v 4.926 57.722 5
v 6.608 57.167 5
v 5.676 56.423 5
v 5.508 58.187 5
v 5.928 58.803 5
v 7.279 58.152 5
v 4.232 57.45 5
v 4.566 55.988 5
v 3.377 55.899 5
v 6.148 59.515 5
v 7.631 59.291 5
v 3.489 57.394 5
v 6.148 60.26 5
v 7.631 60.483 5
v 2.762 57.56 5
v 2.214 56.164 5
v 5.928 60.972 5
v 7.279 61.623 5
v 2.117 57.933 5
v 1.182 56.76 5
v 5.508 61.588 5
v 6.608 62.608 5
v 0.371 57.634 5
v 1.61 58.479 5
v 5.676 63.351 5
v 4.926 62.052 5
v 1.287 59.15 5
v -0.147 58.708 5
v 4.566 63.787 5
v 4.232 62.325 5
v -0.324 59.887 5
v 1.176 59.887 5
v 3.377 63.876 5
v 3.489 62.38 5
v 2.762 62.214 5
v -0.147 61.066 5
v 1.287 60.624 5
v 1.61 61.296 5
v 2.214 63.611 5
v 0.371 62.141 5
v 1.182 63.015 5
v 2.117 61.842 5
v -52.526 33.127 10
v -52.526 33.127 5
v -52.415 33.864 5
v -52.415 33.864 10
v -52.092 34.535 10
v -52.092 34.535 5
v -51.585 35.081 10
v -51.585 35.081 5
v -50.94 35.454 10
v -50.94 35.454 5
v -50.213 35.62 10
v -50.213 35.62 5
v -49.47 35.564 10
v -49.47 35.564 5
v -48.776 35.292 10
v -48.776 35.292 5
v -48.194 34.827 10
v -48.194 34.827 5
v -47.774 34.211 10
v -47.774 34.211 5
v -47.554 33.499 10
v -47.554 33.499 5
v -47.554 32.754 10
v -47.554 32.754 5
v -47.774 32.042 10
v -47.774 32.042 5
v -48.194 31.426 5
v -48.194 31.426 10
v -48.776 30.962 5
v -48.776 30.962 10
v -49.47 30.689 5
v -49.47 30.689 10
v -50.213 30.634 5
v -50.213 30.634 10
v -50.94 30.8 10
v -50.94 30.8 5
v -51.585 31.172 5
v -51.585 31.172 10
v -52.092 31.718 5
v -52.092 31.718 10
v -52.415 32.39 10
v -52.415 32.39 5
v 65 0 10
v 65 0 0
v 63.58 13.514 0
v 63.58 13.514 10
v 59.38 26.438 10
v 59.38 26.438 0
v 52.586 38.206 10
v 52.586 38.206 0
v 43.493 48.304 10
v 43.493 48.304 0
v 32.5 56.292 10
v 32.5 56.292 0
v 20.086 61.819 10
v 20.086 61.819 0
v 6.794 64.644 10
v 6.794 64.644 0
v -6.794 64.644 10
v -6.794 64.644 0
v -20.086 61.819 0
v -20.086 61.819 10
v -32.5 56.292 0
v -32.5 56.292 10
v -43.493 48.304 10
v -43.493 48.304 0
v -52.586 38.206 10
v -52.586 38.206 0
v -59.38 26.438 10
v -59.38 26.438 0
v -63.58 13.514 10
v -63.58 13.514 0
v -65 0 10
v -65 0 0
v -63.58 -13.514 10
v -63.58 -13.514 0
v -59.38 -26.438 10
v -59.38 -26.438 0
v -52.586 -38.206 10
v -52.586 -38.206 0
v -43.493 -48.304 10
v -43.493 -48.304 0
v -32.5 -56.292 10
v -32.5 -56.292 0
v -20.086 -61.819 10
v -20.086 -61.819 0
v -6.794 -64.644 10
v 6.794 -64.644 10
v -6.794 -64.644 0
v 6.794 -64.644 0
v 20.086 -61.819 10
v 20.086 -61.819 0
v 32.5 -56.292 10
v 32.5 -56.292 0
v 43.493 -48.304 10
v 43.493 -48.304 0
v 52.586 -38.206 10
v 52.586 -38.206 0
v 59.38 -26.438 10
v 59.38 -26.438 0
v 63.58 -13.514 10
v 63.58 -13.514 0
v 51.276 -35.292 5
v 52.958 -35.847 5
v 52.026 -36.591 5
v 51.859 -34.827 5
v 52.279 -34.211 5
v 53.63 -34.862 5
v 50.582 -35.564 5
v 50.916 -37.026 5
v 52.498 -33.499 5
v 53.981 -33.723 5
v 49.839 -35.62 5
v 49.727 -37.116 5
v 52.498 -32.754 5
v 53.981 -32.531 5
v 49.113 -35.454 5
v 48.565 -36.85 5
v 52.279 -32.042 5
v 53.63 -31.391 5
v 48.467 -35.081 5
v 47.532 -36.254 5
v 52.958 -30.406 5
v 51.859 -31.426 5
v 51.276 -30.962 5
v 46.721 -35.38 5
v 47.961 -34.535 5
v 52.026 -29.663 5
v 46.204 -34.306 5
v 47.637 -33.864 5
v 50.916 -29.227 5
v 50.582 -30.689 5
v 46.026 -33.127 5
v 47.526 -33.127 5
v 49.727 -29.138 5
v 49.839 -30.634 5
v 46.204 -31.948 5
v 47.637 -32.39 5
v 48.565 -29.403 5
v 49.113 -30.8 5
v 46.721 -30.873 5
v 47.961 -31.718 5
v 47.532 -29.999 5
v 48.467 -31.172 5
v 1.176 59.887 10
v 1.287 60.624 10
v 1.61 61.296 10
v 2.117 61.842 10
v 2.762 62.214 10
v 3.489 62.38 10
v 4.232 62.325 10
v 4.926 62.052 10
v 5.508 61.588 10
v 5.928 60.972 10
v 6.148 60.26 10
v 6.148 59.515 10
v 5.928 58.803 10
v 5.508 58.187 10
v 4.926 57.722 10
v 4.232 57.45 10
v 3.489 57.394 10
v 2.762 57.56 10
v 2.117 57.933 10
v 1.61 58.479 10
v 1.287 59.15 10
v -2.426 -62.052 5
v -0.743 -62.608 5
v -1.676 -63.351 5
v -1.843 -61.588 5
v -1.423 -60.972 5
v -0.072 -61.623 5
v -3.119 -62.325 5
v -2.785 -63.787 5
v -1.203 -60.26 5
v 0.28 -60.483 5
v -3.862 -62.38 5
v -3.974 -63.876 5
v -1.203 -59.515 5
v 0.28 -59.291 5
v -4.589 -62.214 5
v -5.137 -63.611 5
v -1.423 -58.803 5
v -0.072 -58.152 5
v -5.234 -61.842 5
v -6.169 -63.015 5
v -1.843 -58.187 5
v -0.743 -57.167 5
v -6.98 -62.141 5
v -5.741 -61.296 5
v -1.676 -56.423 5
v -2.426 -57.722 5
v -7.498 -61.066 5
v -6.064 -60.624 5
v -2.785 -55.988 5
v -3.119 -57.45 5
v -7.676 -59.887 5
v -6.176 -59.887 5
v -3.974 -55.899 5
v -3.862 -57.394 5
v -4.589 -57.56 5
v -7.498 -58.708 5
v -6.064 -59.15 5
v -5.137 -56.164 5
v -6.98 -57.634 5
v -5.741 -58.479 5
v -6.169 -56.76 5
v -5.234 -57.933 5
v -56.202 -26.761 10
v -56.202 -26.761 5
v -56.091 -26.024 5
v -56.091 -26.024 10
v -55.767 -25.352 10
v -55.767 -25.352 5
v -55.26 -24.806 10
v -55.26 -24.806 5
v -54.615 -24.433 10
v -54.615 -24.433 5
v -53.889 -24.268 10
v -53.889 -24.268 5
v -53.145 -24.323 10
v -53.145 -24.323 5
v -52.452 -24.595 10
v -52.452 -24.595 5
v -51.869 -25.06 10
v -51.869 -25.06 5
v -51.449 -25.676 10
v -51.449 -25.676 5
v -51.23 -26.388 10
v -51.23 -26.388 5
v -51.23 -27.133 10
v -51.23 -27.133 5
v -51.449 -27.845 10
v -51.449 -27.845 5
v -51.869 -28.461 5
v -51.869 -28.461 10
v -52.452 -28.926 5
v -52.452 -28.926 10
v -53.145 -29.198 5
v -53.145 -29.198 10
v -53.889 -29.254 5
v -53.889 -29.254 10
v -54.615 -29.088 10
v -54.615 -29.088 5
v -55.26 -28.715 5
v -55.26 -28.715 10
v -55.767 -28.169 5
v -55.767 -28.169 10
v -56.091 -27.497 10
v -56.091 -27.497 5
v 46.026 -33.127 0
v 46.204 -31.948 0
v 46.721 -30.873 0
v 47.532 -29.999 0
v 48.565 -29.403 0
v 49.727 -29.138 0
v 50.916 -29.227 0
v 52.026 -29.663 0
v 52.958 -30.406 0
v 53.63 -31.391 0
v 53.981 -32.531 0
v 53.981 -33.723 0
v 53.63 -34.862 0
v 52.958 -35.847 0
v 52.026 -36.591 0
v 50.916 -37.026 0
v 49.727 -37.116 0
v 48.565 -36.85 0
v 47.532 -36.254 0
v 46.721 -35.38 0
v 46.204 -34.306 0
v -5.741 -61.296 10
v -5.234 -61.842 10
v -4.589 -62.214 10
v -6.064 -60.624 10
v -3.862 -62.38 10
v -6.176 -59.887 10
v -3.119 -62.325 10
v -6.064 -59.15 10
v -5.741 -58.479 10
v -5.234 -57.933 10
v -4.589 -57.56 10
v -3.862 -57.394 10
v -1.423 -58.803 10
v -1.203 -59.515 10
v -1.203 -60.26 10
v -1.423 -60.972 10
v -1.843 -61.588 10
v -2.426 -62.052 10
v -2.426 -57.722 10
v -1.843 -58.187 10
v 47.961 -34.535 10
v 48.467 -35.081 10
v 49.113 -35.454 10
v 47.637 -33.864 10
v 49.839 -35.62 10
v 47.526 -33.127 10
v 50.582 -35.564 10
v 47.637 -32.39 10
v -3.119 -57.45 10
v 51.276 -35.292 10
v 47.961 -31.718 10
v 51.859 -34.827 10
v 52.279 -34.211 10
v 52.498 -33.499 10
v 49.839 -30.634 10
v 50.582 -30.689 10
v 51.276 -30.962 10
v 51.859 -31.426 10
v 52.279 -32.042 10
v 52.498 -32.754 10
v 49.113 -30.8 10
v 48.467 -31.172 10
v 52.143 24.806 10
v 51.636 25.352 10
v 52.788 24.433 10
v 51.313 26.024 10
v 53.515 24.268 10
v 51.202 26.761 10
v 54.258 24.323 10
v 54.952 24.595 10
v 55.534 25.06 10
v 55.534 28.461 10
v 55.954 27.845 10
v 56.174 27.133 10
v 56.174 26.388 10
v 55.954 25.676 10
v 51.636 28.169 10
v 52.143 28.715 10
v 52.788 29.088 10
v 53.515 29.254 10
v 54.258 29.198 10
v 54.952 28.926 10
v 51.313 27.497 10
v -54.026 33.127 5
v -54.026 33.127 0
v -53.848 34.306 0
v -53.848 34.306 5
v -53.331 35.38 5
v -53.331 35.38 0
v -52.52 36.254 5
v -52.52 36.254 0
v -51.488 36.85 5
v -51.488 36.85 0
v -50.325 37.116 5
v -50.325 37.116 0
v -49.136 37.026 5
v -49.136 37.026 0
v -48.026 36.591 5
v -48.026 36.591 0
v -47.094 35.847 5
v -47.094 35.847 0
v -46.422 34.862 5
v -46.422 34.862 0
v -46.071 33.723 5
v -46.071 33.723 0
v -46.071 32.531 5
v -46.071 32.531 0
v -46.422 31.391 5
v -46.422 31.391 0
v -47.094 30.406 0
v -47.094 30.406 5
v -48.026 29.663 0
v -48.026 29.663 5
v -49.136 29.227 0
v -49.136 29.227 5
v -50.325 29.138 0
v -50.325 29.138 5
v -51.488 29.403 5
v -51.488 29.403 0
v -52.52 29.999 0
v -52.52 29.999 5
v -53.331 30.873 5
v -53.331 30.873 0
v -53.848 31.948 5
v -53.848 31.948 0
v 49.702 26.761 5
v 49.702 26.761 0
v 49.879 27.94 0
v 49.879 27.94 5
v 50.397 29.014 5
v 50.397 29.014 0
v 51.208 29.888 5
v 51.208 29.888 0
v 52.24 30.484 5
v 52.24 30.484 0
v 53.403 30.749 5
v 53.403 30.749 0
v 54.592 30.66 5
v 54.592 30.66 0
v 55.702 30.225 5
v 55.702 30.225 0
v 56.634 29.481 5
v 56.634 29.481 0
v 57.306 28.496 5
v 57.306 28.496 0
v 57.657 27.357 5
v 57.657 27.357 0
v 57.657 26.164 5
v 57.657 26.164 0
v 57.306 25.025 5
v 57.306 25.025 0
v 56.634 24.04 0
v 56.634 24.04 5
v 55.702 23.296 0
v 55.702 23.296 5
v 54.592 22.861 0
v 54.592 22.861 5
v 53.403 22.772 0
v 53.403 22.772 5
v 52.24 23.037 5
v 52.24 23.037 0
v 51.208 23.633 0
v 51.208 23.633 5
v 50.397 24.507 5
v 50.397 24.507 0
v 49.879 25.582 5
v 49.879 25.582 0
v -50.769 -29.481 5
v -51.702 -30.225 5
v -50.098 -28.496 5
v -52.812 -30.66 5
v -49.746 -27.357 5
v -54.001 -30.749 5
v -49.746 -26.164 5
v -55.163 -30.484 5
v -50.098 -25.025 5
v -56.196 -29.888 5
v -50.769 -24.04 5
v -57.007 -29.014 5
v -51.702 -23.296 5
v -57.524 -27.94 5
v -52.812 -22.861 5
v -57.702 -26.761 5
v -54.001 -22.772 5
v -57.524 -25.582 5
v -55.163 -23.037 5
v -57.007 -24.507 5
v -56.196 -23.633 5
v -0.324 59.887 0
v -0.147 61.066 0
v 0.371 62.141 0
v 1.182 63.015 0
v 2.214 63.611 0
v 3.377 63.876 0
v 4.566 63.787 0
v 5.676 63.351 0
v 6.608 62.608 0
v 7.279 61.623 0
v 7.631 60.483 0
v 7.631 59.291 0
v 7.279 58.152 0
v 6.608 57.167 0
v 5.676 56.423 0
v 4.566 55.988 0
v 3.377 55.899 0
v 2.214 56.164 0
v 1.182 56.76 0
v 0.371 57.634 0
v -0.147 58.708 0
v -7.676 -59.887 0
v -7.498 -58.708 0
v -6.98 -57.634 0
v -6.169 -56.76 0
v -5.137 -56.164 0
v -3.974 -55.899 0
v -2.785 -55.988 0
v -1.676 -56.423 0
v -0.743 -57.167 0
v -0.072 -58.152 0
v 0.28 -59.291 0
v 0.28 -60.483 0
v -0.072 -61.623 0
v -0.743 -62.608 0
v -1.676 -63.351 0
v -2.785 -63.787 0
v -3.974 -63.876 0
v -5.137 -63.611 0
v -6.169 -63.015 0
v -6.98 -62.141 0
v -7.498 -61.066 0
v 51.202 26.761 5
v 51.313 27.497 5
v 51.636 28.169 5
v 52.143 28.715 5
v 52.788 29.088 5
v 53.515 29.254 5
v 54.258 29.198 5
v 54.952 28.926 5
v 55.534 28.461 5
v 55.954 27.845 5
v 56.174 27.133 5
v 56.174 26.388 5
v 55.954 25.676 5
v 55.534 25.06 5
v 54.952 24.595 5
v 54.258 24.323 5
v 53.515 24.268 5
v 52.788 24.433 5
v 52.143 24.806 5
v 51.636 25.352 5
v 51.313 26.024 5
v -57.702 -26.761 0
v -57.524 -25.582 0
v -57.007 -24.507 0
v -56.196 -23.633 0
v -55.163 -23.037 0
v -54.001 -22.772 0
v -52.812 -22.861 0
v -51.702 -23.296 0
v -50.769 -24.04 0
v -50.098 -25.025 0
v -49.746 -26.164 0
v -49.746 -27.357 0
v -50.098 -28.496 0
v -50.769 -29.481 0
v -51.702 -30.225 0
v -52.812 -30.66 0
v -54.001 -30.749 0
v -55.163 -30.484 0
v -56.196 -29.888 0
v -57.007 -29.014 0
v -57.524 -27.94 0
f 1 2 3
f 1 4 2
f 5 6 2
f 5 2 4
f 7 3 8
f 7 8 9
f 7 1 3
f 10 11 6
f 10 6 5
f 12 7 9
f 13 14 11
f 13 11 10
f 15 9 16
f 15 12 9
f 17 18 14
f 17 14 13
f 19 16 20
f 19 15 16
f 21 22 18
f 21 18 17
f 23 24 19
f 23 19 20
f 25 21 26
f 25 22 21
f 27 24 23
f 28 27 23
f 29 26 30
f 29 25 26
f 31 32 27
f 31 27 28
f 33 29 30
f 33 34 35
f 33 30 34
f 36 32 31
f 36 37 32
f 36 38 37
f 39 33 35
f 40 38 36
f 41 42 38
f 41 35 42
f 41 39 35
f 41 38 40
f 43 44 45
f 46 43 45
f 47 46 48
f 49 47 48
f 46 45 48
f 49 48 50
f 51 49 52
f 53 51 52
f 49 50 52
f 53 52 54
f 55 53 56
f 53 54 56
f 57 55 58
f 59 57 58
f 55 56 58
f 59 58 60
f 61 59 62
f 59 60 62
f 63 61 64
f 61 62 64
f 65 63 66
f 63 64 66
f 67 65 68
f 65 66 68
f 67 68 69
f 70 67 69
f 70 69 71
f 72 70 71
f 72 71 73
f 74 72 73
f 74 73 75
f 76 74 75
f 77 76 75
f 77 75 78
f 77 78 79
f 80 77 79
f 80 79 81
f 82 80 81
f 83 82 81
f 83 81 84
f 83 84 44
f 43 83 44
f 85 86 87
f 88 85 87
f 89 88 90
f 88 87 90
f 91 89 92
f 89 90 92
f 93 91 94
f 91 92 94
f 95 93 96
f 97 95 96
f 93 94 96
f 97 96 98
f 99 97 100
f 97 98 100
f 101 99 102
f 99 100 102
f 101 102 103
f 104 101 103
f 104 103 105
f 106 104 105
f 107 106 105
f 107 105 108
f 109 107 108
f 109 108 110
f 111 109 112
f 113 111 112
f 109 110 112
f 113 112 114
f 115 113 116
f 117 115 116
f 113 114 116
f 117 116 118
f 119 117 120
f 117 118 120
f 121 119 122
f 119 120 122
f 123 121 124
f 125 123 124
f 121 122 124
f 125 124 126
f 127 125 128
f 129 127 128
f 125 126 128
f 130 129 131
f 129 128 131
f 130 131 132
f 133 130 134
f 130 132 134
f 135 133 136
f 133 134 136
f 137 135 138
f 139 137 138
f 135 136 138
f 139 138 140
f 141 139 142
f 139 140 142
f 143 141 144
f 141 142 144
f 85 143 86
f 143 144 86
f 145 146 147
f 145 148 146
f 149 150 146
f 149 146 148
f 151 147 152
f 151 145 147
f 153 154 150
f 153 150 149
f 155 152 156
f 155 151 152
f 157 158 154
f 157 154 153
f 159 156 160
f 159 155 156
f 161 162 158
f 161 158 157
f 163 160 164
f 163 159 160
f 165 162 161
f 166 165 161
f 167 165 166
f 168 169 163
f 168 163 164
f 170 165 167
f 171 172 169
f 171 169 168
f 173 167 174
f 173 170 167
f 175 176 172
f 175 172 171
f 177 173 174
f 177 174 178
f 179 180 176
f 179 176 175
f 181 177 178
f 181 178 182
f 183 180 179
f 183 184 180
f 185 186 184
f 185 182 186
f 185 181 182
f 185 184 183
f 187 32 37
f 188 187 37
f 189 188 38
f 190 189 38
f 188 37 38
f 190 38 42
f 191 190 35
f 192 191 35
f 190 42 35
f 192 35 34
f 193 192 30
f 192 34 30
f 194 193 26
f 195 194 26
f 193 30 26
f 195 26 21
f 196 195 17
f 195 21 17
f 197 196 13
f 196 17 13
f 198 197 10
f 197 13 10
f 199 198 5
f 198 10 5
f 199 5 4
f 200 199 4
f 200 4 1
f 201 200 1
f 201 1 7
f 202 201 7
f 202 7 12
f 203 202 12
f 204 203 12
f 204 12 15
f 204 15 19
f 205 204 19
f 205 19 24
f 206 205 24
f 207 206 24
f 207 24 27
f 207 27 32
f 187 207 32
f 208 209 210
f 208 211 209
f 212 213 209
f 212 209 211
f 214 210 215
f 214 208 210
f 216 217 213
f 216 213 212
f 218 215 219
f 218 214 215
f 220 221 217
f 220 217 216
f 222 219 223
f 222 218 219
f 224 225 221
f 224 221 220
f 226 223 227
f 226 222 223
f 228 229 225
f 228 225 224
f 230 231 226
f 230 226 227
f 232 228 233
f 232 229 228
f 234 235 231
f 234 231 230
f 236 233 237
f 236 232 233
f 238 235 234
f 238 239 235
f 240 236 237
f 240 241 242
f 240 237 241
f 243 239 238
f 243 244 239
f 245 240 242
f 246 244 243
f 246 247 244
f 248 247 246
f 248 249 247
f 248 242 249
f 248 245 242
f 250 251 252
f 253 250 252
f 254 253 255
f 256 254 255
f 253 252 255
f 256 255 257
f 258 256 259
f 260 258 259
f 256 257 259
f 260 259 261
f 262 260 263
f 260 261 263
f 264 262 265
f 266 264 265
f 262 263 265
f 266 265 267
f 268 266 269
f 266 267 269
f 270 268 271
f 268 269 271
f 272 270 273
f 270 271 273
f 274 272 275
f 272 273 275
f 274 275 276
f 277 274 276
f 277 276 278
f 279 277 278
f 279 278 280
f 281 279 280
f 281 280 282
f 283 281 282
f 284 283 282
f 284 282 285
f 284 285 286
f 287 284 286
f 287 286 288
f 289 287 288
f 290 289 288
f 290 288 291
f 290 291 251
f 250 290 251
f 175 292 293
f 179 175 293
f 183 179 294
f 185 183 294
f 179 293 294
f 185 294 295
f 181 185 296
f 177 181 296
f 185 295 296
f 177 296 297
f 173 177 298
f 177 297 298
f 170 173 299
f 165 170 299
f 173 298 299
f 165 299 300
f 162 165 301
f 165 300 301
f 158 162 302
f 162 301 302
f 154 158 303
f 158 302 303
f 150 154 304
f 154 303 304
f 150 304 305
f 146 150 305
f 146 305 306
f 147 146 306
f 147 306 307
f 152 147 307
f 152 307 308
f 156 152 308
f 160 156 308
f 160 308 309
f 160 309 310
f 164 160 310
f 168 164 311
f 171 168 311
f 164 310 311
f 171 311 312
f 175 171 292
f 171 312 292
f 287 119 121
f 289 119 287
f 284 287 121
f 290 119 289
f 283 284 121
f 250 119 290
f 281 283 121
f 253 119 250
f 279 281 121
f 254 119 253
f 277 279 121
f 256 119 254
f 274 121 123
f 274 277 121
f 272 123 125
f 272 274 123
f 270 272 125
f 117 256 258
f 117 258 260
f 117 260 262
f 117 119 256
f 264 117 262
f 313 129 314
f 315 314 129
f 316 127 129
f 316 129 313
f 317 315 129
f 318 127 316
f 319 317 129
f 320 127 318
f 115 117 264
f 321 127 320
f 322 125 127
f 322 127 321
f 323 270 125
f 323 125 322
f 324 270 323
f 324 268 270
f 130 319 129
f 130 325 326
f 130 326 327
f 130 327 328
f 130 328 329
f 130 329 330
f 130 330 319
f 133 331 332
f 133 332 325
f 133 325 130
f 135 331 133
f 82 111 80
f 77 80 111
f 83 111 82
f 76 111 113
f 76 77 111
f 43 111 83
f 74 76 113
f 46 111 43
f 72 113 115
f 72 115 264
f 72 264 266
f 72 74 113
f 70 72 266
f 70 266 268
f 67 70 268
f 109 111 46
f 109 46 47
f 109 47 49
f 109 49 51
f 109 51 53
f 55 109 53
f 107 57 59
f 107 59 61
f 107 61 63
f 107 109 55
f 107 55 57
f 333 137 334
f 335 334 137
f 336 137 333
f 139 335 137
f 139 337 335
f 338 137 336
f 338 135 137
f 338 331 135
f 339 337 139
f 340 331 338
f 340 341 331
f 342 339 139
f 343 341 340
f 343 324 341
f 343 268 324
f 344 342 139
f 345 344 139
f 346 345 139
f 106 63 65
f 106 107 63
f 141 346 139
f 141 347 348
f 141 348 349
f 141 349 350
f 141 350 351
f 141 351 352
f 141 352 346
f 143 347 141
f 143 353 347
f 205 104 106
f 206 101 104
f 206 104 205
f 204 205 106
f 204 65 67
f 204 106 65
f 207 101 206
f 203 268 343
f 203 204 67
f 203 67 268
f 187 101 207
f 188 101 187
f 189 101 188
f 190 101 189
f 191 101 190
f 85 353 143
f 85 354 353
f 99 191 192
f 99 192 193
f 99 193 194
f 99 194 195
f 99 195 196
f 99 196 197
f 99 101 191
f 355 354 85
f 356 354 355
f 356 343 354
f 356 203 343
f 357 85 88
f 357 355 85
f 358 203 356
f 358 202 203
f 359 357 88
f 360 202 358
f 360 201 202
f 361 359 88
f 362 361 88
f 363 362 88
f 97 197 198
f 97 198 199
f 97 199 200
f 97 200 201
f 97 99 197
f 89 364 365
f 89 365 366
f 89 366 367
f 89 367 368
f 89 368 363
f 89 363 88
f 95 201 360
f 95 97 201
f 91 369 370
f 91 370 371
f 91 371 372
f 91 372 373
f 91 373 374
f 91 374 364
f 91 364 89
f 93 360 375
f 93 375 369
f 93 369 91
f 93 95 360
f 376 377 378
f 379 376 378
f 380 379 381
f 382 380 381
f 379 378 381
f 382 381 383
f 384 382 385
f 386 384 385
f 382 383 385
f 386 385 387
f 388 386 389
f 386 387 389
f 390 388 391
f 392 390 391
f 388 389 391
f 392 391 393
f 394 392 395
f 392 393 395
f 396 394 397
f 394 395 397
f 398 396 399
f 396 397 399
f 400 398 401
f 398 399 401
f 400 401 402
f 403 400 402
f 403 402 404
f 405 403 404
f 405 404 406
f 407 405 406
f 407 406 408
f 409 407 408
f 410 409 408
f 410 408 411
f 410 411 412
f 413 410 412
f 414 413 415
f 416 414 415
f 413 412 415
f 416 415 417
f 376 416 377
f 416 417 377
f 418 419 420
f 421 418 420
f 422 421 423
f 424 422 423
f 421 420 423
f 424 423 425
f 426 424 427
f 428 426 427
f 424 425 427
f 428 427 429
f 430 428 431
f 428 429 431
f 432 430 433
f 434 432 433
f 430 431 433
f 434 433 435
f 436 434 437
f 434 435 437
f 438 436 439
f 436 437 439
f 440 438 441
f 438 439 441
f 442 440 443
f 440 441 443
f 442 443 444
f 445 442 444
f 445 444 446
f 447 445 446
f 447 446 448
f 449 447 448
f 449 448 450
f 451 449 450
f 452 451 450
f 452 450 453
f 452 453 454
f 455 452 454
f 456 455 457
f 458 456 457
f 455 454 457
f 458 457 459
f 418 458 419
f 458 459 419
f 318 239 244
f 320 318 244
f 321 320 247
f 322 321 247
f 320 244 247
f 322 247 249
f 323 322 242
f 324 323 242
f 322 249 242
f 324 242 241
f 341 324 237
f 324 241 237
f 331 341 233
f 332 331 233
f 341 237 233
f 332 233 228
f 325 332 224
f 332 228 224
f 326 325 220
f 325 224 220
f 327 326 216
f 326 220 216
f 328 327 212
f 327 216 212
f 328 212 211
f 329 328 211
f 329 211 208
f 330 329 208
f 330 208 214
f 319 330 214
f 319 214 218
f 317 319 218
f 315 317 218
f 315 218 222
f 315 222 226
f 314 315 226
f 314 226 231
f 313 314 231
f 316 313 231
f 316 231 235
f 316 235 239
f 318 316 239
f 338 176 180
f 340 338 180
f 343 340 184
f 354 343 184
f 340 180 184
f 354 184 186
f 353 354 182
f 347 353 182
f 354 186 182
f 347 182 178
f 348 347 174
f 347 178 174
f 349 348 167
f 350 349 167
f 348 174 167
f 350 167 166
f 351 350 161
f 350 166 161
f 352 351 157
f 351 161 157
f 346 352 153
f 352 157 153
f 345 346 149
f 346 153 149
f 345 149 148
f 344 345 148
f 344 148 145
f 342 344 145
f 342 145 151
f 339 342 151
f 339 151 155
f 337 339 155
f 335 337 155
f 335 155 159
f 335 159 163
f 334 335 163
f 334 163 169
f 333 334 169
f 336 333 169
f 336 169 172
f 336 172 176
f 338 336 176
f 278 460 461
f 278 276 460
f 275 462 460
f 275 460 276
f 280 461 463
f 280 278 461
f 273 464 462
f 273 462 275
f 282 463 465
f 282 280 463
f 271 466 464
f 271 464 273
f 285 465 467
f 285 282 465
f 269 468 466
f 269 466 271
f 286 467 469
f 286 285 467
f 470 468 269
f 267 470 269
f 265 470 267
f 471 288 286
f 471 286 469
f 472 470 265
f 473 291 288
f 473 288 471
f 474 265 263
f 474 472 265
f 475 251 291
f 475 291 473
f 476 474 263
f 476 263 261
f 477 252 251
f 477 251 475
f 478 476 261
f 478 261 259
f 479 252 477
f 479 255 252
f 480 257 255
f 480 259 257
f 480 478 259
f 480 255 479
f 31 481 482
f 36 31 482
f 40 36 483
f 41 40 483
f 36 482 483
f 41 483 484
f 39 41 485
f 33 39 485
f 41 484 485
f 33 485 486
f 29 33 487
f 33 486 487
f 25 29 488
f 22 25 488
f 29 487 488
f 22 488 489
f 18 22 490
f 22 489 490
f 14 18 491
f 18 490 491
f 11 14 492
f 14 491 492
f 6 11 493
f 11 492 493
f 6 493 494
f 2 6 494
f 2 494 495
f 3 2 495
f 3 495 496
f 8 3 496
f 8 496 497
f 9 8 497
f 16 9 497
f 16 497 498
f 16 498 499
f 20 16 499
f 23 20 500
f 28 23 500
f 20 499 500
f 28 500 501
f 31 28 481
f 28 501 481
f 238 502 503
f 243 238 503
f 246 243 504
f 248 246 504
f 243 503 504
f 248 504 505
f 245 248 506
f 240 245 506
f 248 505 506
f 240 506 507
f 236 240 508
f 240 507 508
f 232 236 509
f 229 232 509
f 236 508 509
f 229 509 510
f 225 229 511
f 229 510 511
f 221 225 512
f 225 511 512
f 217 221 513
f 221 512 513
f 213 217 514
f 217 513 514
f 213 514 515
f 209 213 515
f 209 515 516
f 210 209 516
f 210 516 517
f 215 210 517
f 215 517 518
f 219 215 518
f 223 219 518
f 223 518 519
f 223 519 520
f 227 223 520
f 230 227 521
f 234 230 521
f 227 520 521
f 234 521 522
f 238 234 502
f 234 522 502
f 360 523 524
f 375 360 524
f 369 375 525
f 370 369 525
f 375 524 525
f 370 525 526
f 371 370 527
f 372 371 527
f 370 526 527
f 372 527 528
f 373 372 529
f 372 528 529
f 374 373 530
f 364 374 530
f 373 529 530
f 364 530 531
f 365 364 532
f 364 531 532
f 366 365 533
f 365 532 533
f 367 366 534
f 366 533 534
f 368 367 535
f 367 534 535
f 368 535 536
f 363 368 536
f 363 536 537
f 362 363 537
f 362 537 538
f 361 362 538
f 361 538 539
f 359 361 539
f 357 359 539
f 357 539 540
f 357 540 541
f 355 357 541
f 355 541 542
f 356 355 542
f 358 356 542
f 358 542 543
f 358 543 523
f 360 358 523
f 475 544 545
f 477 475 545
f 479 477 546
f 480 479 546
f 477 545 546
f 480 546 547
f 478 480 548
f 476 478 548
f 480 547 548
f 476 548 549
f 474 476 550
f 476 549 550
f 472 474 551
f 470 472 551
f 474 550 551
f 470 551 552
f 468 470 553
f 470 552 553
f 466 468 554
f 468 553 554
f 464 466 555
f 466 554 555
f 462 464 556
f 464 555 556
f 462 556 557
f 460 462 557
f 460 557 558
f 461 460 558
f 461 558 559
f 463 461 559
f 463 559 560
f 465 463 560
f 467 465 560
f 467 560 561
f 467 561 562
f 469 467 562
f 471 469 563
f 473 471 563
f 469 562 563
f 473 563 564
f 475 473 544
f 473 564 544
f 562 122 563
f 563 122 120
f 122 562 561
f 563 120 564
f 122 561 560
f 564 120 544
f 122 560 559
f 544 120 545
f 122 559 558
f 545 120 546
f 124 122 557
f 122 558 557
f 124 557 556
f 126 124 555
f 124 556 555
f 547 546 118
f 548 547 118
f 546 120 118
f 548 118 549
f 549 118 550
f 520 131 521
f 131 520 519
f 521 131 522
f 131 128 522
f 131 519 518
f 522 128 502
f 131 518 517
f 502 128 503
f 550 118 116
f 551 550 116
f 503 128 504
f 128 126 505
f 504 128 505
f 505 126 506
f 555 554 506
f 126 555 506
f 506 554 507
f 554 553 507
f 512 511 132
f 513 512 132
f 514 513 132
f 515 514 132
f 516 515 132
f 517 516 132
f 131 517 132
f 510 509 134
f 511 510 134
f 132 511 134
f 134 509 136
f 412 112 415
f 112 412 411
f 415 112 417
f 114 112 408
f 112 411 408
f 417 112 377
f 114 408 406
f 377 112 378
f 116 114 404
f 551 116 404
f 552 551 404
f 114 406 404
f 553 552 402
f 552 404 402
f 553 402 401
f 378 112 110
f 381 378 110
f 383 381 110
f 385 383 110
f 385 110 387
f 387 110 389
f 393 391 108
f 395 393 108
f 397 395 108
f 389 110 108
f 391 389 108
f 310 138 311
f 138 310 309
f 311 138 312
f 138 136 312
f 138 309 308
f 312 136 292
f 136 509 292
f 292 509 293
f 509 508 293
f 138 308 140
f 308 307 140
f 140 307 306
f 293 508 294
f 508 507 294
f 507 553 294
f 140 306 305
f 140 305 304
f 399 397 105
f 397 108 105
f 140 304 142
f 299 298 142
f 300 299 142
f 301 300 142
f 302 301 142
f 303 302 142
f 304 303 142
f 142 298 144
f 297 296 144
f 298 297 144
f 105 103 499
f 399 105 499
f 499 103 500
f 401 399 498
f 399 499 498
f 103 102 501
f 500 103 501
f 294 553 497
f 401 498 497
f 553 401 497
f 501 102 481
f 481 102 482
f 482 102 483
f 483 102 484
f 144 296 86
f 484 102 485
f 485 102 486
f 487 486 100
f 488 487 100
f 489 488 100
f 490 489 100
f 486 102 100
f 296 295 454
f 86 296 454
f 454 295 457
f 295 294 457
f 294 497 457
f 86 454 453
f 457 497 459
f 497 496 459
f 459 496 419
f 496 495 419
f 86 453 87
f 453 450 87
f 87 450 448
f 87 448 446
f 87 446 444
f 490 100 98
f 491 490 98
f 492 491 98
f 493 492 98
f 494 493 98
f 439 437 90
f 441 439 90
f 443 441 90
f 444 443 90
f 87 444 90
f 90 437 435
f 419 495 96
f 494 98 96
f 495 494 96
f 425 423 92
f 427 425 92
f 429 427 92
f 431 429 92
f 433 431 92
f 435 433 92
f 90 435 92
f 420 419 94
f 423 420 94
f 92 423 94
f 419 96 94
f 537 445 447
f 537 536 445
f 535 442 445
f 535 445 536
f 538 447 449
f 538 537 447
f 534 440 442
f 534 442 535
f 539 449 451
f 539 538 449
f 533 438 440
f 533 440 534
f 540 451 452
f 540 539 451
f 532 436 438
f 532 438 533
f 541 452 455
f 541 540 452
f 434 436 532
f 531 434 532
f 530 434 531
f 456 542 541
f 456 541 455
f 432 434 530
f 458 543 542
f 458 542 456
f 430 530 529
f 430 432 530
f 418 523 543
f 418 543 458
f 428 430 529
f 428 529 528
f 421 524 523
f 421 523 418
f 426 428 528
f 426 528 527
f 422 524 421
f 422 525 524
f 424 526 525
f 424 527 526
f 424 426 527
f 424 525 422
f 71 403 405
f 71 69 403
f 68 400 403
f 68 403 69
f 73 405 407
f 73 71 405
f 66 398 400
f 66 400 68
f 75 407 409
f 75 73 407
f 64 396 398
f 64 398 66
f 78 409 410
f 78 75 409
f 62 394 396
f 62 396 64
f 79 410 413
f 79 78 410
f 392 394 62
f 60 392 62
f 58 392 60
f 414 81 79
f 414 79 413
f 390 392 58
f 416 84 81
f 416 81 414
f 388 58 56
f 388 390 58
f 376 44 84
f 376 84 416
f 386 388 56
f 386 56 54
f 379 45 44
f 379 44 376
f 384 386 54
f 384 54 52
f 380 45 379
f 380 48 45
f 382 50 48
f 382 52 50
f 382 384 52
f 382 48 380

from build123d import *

# Parameters (mm, degrees)
SKETCH_1_R          = 65
SKETCH_1_R_2        = 60
SKETCH_1_R_3        = 55
EXTRUDE_1_DEPTH     = 10
CUT_EXTRUDE_1_REACH = 94.466
SKETCH_2_R          = 2.5
SKETCH_3_R          = 4
SKETCH_3_R_2        = 2.5
CUT_EXTRUDE_2_DEPTH = 5


with BuildPart() as part:
    # 草图1 → 凸台-拉伸1 (new body)
    # profile 1 of 3: a face of its own
    with BuildSketch(Plane.XY):
        Circle(SKETCH_1_R)
        Circle(SKETCH_1_R_2, mode=Mode.SUBTRACT)
    # profile 2 of 3: a face of its own
    with BuildSketch(Plane.XY):
        Circle(SKETCH_1_R_2)
        Circle(SKETCH_1_R_3, mode=Mode.SUBTRACT)
    # profile 3 of 3: a face of its own
    with BuildSketch(Plane.XY):
        Circle(SKETCH_1_R_3)
    extrude(amount=EXTRUDE_1_DEPTH)

    # 草图2 → 切除-拉伸1 (cut, up to next)
    with BuildSketch(Plane(origin=(0, 0, 0), x_dir=(-1, 0, 0), z_dir=(0, 0, -1)), mode=Mode.PRIVATE) as cut_extrude_1_sk1:
        with Locations((-3.675520948, 59.887315399)):
            Circle(SKETCH_2_R)
    cut_extrude_1_tool1 = extrude(cut_extrude_1_sk1.sketch, amount=-CUT_EXTRUDE_1_REACH, mode=Mode.PRIVATE) & part.part
    # 草图2 → 切除-拉伸1 (cut, up to next)
    with BuildSketch(Plane(origin=(0, 0, 0), x_dir=(-1, 0, 0), z_dir=(0, 0, -1)), mode=Mode.PRIVATE) as cut_extrude_1_sk2:
        with Locations((50.026176026, 33.126752213)):
            Circle(SKETCH_2_R)
    cut_extrude_1_tool2 = extrude(cut_extrude_1_sk2.sketch, amount=-CUT_EXTRUDE_1_REACH, mode=Mode.PRIVATE) & part.part
    # 草图2 → 切除-拉伸1 (cut, up to next)
    with BuildSketch(Plane(origin=(0, 0, 0), x_dir=(-1, 0, 0), z_dir=(0, 0, -1)), mode=Mode.PRIVATE) as cut_extrude_1_sk3:
        with Locations((53.701696975, -26.760563186)):
            Circle(SKETCH_2_R)
    cut_extrude_1_tool3 = extrude(cut_extrude_1_sk3.sketch, amount=-CUT_EXTRUDE_1_REACH, mode=Mode.PRIVATE) & part.part
    # 草图2 → 切除-拉伸1 (cut, up to next)
    with BuildSketch(Plane(origin=(0, 0, 0), x_dir=(-1, 0, 0), z_dir=(0, 0, -1)), mode=Mode.PRIVATE) as cut_extrude_1_sk4:
        with Locations((3.675520948, -59.887315399)):
            Circle(SKETCH_2_R)
    cut_extrude_1_tool4 = extrude(cut_extrude_1_sk4.sketch, amount=-CUT_EXTRUDE_1_REACH, mode=Mode.PRIVATE) & part.part
    # 草图2 → 切除-拉伸1 (cut, up to next)
    with BuildSketch(Plane(origin=(0, 0, 0), x_dir=(-1, 0, 0), z_dir=(0, 0, -1)), mode=Mode.PRIVATE) as cut_extrude_1_sk5:
        with Locations((-50.026176026, -33.126752213)):
            Circle(SKETCH_2_R)
    cut_extrude_1_tool5 = extrude(cut_extrude_1_sk5.sketch, amount=-CUT_EXTRUDE_1_REACH, mode=Mode.PRIVATE) & part.part
    # 草图2 → 切除-拉伸1 (cut, up to next)
    with BuildSketch(Plane(origin=(0, 0, 0), x_dir=(-1, 0, 0), z_dir=(0, 0, -1)), mode=Mode.PRIVATE) as cut_extrude_1_sk6:
        with Locations((-53.701696975, 26.760563186)):
            Circle(SKETCH_2_R)
    cut_extrude_1_tool6 = extrude(cut_extrude_1_sk6.sketch, amount=-CUT_EXTRUDE_1_REACH, mode=Mode.PRIVATE) & part.part
    add(cut_extrude_1_tool1.solids().sort_by_distance((3.675521, 59.887315, 0))[0], mode=Mode.SUBTRACT)
    add(cut_extrude_1_tool2.solids().sort_by_distance((-50.026176, 33.126752, 0))[0], mode=Mode.SUBTRACT)
    add(cut_extrude_1_tool3.solids().sort_by_distance((-53.701697, -26.760563, 0))[0], mode=Mode.SUBTRACT)
    add(cut_extrude_1_tool4.solids().sort_by_distance((-3.675521, -59.887315, 0))[0], mode=Mode.SUBTRACT)
    add(cut_extrude_1_tool5.solids().sort_by_distance((50.026176, -33.126752, 0))[0], mode=Mode.SUBTRACT)
    add(cut_extrude_1_tool6.solids().sort_by_distance((53.701697, 26.760563, 0))[0], mode=Mode.SUBTRACT)

    # 草图3 → 切除-拉伸2 (cut)
    # profile 1 of 6: a face of its own
    with BuildSketch(Plane(origin=(0, 0, 0), x_dir=(-1, 0, 0), z_dir=(0, 0, -1))):
        with Locations((-3.675520948, 59.887315399)):
            Circle(SKETCH_3_R)
        with Locations((-3.675520948, 59.887315399)):
            Circle(SKETCH_3_R_2, mode=Mode.SUBTRACT)
    # profile 2 of 6: a face of its own
    with BuildSketch(Plane(origin=(0, 0, 0), x_dir=(-1, 0, 0), z_dir=(0, 0, -1))):
        with Locations((50.026176026, 33.126752213)):
            Circle(SKETCH_3_R)
    # profile 3 of 6: a face of its own
    with BuildSketch(Plane(origin=(0, 0, 0), x_dir=(-1, 0, 0), z_dir=(0, 0, -1))):
        with Locations((53.701696975, -26.760563186)):
            Circle(SKETCH_3_R)
    # profile 4 of 6: a face of its own
    with BuildSketch(Plane(origin=(0, 0, 0), x_dir=(-1, 0, 0), z_dir=(0, 0, -1))):
        with Locations((3.675520948, -59.887315399)):
            Circle(SKETCH_3_R)
    # profile 5 of 6: a face of its own
    with BuildSketch(Plane(origin=(0, 0, 0), x_dir=(-1, 0, 0), z_dir=(0, 0, -1))):
        with Locations((-50.026176026, -33.126752213)):
            Circle(SKETCH_3_R)
    # profile 6 of 6: a face of its own
    with BuildSketch(Plane(origin=(0, 0, 0), x_dir=(-1, 0, 0), z_dir=(0, 0, -1))):
        with Locations((-53.701696975, 26.760563186)):
            Circle(SKETCH_3_R)
    extrude(amount=-CUT_EXTRUDE_2_DEPTH, mode=Mode.SUBTRACT)


solid = part.part
